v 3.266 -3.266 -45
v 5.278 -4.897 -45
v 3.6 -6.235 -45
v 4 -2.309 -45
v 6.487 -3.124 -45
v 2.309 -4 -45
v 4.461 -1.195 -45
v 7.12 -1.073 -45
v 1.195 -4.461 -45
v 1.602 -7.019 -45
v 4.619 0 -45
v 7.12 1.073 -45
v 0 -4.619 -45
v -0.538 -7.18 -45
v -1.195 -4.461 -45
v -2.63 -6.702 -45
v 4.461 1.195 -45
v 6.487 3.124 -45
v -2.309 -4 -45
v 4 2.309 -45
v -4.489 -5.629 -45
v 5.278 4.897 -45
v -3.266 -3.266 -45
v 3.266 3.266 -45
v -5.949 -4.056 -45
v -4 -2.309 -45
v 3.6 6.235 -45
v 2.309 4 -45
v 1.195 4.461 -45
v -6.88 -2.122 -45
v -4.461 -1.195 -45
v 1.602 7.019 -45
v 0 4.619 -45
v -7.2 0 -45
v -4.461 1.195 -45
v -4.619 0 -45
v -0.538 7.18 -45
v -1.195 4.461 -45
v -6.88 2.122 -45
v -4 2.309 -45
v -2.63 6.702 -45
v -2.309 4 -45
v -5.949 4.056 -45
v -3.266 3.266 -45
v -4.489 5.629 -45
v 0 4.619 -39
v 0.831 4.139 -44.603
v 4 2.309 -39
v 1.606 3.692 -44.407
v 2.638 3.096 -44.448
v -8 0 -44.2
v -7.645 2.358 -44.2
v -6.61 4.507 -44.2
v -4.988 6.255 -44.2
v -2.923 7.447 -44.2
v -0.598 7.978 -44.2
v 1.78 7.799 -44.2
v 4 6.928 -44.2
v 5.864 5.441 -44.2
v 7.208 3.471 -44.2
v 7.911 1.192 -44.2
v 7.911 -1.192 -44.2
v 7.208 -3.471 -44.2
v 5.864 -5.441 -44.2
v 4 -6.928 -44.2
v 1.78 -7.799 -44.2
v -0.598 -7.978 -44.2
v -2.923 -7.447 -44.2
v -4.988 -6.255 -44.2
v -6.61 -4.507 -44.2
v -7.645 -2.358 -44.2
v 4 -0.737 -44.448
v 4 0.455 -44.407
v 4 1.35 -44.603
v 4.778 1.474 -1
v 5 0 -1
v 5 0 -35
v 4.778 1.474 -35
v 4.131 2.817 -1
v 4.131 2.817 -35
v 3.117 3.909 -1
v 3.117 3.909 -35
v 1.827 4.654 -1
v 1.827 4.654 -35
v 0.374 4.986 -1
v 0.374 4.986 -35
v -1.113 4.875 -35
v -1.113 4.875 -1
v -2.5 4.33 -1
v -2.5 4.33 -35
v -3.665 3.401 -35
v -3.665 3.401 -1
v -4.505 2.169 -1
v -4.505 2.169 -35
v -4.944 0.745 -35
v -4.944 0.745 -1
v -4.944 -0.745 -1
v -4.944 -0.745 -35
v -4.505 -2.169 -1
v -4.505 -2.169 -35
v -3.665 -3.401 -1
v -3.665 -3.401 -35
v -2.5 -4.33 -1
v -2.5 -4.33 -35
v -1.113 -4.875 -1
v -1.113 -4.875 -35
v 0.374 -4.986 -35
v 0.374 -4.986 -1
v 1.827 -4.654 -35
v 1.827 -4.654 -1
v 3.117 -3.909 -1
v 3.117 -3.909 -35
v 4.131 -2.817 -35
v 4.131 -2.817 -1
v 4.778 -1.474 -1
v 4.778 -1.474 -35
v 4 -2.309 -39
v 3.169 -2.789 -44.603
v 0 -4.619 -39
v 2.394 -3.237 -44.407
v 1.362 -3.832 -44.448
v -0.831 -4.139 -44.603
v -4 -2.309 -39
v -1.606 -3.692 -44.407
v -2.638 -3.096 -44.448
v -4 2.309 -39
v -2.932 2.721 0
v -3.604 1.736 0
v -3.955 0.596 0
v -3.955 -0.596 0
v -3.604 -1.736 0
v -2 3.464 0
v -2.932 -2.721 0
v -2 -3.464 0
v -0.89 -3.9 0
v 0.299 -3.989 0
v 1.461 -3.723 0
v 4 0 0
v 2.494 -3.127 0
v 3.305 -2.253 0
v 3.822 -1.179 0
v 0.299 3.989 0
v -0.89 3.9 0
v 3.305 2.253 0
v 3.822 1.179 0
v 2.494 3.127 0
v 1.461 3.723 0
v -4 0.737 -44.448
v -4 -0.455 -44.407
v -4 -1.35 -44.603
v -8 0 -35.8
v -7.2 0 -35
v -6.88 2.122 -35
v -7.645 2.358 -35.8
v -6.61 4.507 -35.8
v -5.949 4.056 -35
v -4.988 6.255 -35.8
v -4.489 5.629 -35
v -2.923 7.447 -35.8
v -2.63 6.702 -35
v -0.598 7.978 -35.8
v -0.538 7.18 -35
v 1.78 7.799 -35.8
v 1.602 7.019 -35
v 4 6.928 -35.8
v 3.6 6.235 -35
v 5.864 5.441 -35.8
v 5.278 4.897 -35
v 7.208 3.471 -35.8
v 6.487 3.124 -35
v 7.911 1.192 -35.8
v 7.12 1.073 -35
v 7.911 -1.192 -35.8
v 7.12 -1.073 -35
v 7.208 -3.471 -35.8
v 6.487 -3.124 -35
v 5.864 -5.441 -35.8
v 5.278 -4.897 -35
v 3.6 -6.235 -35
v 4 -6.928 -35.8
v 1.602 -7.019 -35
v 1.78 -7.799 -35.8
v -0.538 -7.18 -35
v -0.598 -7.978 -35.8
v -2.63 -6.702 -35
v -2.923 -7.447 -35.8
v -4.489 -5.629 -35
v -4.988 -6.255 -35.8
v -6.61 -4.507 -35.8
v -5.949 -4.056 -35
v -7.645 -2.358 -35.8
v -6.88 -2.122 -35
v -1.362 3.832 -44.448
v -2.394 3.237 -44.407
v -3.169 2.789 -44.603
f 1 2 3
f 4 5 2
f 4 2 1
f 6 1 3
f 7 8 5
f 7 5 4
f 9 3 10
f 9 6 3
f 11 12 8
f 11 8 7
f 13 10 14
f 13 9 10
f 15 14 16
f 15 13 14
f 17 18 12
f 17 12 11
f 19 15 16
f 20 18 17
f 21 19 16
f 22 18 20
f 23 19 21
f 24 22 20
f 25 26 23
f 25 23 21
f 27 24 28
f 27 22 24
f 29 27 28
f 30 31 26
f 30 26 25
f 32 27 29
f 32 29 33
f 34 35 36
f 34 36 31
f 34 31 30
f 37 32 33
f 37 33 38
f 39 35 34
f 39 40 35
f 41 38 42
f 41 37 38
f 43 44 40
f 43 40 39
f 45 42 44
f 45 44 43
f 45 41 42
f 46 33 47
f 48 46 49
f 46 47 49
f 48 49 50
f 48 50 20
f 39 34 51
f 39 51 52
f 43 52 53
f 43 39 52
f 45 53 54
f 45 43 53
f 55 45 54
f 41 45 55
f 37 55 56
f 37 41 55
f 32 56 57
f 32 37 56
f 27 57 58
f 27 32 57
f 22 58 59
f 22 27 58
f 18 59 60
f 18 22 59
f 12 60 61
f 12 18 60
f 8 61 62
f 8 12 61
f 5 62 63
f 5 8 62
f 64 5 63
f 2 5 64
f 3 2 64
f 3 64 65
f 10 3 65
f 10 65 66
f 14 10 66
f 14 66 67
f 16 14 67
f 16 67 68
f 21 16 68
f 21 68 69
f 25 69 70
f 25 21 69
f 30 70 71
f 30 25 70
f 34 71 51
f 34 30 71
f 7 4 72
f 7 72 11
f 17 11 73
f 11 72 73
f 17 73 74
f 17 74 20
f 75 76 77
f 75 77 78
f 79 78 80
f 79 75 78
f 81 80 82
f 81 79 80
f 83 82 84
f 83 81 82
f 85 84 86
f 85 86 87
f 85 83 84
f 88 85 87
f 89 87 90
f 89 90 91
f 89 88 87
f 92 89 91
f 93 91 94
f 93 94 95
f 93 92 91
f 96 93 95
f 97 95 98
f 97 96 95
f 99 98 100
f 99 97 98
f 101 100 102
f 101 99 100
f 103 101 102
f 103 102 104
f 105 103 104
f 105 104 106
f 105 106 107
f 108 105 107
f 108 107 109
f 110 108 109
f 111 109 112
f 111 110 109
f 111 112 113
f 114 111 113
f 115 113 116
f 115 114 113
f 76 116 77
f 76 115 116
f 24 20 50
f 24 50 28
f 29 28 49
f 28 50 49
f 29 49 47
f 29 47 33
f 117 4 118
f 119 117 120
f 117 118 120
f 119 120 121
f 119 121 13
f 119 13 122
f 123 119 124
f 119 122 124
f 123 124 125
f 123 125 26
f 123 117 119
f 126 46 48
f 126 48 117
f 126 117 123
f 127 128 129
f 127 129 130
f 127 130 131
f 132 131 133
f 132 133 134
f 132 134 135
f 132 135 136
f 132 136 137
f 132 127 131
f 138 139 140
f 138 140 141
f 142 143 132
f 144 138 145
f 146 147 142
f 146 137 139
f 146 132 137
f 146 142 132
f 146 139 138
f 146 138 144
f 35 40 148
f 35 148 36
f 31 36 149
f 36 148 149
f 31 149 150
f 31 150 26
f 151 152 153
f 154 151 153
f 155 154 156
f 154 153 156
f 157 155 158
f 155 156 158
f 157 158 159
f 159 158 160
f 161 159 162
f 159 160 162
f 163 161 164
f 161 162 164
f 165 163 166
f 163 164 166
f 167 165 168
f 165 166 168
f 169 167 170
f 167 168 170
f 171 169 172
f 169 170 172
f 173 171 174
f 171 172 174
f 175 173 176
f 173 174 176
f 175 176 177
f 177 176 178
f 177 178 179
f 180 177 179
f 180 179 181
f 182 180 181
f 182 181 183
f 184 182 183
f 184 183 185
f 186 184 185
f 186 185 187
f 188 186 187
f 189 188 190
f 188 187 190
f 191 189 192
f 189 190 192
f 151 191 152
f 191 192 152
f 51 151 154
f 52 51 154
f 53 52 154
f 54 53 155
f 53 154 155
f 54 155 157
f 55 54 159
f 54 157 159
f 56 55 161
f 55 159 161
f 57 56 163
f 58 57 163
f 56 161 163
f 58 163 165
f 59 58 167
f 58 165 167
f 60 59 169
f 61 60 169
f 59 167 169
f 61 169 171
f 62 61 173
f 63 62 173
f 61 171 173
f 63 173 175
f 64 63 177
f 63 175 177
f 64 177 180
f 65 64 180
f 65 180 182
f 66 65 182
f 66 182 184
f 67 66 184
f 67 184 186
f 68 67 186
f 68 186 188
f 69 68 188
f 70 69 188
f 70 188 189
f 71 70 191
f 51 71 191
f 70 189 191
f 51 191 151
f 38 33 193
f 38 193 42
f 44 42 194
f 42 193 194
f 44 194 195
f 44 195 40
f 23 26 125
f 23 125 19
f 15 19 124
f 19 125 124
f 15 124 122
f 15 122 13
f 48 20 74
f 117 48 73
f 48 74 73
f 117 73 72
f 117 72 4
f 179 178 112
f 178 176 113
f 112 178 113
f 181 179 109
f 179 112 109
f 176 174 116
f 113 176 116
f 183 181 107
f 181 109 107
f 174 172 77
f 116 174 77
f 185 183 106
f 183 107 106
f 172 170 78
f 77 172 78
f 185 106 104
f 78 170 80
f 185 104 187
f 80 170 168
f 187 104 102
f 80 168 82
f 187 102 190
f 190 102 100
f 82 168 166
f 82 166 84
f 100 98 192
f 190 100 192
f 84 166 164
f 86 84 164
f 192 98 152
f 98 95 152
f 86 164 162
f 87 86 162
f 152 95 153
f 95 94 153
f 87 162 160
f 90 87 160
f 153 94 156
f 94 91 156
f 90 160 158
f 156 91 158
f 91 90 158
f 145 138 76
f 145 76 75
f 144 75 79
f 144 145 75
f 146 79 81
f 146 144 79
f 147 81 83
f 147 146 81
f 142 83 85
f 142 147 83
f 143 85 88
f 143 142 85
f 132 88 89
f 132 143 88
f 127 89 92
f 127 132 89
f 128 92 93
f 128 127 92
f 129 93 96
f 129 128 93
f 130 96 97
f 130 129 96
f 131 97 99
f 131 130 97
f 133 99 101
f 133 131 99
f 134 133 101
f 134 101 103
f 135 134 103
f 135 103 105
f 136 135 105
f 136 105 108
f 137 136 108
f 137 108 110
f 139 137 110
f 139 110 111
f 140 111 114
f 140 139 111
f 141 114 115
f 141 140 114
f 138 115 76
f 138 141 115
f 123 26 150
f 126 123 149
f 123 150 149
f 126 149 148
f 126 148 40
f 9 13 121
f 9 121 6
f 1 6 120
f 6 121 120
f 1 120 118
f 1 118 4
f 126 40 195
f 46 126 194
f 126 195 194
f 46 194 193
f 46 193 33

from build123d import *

# Parameters (mm, degrees)
SKETCH1_R          = 5
EXTRUDE1_DEPTH     = 35
SKETCH6_R          = 8
EXTRUDE2_DEPTH     = 10
CUT_EXTRUDE1_DEPTH = 6
CHAMFER1_SIZE      = 0.8
CHAMFER2_SIZE      = 1


with BuildPart() as part:
    # Sketch1 → Extrude1 (new body)
    with BuildSketch(Plane.XY):
        Circle(SKETCH1_R)
    extrude(amount=-EXTRUDE1_DEPTH)

    # Sketch6 → Extrude2 (add)
    with BuildSketch(Plane(origin=(0, 0, -35), x_dir=(-1, 0, 0), z_dir=(0, 0, -1))):
        Circle(SKETCH6_R)
    extrude(amount=EXTRUDE2_DEPTH)

    # Sketch7 → Cut-Extrude1 (cut)
    with BuildSketch(Plane(origin=(0, 0, -45), x_dir=(-1, 0, 0), z_dir=(0, 0, -1))):
        Polygon((0, 4.618802154), (-4, 2.309401077), (-4, -2.309401077), (0, -4.618802154), (4, -2.309401077), (4, 2.309401077), align=None)
    extrude(amount=-CUT_EXTRUDE1_DEPTH, mode=Mode.SUBTRACT)

    # Cut-Extrude2 cone 1 section (through the dimple's axis) → Cut-Extrude2 (revolve, cut)
    with BuildSketch(Plane(origin=(0, 0, -45), x_dir=(0, 1, 0), z_dir=(1, 0, 0))):
        Polygon((0, 0), (4.618802154, 0), (0, 4.618802154), align=None)
    revolve(axis=Axis((0, 0, -45), (0, 0, 1)), mode=Mode.SUBTRACT)

    # Chamfer1
    chamfer1_edges = [part.edges().sort_by_distance(p)[0] for p in [
        (8, 0, -35),
        (8, 0, -45),
    ]]
    chamfer(chamfer1_edges, length=CHAMFER1_SIZE)

    # Chamfer2
    chamfer2_edges = [part.edges().sort_by_distance(p)[0] for p in [
        (-5, 0, 0),
    ]]
    chamfer(chamfer2_edges, length=CHAMFER2_SIZE)


solid = part.part
